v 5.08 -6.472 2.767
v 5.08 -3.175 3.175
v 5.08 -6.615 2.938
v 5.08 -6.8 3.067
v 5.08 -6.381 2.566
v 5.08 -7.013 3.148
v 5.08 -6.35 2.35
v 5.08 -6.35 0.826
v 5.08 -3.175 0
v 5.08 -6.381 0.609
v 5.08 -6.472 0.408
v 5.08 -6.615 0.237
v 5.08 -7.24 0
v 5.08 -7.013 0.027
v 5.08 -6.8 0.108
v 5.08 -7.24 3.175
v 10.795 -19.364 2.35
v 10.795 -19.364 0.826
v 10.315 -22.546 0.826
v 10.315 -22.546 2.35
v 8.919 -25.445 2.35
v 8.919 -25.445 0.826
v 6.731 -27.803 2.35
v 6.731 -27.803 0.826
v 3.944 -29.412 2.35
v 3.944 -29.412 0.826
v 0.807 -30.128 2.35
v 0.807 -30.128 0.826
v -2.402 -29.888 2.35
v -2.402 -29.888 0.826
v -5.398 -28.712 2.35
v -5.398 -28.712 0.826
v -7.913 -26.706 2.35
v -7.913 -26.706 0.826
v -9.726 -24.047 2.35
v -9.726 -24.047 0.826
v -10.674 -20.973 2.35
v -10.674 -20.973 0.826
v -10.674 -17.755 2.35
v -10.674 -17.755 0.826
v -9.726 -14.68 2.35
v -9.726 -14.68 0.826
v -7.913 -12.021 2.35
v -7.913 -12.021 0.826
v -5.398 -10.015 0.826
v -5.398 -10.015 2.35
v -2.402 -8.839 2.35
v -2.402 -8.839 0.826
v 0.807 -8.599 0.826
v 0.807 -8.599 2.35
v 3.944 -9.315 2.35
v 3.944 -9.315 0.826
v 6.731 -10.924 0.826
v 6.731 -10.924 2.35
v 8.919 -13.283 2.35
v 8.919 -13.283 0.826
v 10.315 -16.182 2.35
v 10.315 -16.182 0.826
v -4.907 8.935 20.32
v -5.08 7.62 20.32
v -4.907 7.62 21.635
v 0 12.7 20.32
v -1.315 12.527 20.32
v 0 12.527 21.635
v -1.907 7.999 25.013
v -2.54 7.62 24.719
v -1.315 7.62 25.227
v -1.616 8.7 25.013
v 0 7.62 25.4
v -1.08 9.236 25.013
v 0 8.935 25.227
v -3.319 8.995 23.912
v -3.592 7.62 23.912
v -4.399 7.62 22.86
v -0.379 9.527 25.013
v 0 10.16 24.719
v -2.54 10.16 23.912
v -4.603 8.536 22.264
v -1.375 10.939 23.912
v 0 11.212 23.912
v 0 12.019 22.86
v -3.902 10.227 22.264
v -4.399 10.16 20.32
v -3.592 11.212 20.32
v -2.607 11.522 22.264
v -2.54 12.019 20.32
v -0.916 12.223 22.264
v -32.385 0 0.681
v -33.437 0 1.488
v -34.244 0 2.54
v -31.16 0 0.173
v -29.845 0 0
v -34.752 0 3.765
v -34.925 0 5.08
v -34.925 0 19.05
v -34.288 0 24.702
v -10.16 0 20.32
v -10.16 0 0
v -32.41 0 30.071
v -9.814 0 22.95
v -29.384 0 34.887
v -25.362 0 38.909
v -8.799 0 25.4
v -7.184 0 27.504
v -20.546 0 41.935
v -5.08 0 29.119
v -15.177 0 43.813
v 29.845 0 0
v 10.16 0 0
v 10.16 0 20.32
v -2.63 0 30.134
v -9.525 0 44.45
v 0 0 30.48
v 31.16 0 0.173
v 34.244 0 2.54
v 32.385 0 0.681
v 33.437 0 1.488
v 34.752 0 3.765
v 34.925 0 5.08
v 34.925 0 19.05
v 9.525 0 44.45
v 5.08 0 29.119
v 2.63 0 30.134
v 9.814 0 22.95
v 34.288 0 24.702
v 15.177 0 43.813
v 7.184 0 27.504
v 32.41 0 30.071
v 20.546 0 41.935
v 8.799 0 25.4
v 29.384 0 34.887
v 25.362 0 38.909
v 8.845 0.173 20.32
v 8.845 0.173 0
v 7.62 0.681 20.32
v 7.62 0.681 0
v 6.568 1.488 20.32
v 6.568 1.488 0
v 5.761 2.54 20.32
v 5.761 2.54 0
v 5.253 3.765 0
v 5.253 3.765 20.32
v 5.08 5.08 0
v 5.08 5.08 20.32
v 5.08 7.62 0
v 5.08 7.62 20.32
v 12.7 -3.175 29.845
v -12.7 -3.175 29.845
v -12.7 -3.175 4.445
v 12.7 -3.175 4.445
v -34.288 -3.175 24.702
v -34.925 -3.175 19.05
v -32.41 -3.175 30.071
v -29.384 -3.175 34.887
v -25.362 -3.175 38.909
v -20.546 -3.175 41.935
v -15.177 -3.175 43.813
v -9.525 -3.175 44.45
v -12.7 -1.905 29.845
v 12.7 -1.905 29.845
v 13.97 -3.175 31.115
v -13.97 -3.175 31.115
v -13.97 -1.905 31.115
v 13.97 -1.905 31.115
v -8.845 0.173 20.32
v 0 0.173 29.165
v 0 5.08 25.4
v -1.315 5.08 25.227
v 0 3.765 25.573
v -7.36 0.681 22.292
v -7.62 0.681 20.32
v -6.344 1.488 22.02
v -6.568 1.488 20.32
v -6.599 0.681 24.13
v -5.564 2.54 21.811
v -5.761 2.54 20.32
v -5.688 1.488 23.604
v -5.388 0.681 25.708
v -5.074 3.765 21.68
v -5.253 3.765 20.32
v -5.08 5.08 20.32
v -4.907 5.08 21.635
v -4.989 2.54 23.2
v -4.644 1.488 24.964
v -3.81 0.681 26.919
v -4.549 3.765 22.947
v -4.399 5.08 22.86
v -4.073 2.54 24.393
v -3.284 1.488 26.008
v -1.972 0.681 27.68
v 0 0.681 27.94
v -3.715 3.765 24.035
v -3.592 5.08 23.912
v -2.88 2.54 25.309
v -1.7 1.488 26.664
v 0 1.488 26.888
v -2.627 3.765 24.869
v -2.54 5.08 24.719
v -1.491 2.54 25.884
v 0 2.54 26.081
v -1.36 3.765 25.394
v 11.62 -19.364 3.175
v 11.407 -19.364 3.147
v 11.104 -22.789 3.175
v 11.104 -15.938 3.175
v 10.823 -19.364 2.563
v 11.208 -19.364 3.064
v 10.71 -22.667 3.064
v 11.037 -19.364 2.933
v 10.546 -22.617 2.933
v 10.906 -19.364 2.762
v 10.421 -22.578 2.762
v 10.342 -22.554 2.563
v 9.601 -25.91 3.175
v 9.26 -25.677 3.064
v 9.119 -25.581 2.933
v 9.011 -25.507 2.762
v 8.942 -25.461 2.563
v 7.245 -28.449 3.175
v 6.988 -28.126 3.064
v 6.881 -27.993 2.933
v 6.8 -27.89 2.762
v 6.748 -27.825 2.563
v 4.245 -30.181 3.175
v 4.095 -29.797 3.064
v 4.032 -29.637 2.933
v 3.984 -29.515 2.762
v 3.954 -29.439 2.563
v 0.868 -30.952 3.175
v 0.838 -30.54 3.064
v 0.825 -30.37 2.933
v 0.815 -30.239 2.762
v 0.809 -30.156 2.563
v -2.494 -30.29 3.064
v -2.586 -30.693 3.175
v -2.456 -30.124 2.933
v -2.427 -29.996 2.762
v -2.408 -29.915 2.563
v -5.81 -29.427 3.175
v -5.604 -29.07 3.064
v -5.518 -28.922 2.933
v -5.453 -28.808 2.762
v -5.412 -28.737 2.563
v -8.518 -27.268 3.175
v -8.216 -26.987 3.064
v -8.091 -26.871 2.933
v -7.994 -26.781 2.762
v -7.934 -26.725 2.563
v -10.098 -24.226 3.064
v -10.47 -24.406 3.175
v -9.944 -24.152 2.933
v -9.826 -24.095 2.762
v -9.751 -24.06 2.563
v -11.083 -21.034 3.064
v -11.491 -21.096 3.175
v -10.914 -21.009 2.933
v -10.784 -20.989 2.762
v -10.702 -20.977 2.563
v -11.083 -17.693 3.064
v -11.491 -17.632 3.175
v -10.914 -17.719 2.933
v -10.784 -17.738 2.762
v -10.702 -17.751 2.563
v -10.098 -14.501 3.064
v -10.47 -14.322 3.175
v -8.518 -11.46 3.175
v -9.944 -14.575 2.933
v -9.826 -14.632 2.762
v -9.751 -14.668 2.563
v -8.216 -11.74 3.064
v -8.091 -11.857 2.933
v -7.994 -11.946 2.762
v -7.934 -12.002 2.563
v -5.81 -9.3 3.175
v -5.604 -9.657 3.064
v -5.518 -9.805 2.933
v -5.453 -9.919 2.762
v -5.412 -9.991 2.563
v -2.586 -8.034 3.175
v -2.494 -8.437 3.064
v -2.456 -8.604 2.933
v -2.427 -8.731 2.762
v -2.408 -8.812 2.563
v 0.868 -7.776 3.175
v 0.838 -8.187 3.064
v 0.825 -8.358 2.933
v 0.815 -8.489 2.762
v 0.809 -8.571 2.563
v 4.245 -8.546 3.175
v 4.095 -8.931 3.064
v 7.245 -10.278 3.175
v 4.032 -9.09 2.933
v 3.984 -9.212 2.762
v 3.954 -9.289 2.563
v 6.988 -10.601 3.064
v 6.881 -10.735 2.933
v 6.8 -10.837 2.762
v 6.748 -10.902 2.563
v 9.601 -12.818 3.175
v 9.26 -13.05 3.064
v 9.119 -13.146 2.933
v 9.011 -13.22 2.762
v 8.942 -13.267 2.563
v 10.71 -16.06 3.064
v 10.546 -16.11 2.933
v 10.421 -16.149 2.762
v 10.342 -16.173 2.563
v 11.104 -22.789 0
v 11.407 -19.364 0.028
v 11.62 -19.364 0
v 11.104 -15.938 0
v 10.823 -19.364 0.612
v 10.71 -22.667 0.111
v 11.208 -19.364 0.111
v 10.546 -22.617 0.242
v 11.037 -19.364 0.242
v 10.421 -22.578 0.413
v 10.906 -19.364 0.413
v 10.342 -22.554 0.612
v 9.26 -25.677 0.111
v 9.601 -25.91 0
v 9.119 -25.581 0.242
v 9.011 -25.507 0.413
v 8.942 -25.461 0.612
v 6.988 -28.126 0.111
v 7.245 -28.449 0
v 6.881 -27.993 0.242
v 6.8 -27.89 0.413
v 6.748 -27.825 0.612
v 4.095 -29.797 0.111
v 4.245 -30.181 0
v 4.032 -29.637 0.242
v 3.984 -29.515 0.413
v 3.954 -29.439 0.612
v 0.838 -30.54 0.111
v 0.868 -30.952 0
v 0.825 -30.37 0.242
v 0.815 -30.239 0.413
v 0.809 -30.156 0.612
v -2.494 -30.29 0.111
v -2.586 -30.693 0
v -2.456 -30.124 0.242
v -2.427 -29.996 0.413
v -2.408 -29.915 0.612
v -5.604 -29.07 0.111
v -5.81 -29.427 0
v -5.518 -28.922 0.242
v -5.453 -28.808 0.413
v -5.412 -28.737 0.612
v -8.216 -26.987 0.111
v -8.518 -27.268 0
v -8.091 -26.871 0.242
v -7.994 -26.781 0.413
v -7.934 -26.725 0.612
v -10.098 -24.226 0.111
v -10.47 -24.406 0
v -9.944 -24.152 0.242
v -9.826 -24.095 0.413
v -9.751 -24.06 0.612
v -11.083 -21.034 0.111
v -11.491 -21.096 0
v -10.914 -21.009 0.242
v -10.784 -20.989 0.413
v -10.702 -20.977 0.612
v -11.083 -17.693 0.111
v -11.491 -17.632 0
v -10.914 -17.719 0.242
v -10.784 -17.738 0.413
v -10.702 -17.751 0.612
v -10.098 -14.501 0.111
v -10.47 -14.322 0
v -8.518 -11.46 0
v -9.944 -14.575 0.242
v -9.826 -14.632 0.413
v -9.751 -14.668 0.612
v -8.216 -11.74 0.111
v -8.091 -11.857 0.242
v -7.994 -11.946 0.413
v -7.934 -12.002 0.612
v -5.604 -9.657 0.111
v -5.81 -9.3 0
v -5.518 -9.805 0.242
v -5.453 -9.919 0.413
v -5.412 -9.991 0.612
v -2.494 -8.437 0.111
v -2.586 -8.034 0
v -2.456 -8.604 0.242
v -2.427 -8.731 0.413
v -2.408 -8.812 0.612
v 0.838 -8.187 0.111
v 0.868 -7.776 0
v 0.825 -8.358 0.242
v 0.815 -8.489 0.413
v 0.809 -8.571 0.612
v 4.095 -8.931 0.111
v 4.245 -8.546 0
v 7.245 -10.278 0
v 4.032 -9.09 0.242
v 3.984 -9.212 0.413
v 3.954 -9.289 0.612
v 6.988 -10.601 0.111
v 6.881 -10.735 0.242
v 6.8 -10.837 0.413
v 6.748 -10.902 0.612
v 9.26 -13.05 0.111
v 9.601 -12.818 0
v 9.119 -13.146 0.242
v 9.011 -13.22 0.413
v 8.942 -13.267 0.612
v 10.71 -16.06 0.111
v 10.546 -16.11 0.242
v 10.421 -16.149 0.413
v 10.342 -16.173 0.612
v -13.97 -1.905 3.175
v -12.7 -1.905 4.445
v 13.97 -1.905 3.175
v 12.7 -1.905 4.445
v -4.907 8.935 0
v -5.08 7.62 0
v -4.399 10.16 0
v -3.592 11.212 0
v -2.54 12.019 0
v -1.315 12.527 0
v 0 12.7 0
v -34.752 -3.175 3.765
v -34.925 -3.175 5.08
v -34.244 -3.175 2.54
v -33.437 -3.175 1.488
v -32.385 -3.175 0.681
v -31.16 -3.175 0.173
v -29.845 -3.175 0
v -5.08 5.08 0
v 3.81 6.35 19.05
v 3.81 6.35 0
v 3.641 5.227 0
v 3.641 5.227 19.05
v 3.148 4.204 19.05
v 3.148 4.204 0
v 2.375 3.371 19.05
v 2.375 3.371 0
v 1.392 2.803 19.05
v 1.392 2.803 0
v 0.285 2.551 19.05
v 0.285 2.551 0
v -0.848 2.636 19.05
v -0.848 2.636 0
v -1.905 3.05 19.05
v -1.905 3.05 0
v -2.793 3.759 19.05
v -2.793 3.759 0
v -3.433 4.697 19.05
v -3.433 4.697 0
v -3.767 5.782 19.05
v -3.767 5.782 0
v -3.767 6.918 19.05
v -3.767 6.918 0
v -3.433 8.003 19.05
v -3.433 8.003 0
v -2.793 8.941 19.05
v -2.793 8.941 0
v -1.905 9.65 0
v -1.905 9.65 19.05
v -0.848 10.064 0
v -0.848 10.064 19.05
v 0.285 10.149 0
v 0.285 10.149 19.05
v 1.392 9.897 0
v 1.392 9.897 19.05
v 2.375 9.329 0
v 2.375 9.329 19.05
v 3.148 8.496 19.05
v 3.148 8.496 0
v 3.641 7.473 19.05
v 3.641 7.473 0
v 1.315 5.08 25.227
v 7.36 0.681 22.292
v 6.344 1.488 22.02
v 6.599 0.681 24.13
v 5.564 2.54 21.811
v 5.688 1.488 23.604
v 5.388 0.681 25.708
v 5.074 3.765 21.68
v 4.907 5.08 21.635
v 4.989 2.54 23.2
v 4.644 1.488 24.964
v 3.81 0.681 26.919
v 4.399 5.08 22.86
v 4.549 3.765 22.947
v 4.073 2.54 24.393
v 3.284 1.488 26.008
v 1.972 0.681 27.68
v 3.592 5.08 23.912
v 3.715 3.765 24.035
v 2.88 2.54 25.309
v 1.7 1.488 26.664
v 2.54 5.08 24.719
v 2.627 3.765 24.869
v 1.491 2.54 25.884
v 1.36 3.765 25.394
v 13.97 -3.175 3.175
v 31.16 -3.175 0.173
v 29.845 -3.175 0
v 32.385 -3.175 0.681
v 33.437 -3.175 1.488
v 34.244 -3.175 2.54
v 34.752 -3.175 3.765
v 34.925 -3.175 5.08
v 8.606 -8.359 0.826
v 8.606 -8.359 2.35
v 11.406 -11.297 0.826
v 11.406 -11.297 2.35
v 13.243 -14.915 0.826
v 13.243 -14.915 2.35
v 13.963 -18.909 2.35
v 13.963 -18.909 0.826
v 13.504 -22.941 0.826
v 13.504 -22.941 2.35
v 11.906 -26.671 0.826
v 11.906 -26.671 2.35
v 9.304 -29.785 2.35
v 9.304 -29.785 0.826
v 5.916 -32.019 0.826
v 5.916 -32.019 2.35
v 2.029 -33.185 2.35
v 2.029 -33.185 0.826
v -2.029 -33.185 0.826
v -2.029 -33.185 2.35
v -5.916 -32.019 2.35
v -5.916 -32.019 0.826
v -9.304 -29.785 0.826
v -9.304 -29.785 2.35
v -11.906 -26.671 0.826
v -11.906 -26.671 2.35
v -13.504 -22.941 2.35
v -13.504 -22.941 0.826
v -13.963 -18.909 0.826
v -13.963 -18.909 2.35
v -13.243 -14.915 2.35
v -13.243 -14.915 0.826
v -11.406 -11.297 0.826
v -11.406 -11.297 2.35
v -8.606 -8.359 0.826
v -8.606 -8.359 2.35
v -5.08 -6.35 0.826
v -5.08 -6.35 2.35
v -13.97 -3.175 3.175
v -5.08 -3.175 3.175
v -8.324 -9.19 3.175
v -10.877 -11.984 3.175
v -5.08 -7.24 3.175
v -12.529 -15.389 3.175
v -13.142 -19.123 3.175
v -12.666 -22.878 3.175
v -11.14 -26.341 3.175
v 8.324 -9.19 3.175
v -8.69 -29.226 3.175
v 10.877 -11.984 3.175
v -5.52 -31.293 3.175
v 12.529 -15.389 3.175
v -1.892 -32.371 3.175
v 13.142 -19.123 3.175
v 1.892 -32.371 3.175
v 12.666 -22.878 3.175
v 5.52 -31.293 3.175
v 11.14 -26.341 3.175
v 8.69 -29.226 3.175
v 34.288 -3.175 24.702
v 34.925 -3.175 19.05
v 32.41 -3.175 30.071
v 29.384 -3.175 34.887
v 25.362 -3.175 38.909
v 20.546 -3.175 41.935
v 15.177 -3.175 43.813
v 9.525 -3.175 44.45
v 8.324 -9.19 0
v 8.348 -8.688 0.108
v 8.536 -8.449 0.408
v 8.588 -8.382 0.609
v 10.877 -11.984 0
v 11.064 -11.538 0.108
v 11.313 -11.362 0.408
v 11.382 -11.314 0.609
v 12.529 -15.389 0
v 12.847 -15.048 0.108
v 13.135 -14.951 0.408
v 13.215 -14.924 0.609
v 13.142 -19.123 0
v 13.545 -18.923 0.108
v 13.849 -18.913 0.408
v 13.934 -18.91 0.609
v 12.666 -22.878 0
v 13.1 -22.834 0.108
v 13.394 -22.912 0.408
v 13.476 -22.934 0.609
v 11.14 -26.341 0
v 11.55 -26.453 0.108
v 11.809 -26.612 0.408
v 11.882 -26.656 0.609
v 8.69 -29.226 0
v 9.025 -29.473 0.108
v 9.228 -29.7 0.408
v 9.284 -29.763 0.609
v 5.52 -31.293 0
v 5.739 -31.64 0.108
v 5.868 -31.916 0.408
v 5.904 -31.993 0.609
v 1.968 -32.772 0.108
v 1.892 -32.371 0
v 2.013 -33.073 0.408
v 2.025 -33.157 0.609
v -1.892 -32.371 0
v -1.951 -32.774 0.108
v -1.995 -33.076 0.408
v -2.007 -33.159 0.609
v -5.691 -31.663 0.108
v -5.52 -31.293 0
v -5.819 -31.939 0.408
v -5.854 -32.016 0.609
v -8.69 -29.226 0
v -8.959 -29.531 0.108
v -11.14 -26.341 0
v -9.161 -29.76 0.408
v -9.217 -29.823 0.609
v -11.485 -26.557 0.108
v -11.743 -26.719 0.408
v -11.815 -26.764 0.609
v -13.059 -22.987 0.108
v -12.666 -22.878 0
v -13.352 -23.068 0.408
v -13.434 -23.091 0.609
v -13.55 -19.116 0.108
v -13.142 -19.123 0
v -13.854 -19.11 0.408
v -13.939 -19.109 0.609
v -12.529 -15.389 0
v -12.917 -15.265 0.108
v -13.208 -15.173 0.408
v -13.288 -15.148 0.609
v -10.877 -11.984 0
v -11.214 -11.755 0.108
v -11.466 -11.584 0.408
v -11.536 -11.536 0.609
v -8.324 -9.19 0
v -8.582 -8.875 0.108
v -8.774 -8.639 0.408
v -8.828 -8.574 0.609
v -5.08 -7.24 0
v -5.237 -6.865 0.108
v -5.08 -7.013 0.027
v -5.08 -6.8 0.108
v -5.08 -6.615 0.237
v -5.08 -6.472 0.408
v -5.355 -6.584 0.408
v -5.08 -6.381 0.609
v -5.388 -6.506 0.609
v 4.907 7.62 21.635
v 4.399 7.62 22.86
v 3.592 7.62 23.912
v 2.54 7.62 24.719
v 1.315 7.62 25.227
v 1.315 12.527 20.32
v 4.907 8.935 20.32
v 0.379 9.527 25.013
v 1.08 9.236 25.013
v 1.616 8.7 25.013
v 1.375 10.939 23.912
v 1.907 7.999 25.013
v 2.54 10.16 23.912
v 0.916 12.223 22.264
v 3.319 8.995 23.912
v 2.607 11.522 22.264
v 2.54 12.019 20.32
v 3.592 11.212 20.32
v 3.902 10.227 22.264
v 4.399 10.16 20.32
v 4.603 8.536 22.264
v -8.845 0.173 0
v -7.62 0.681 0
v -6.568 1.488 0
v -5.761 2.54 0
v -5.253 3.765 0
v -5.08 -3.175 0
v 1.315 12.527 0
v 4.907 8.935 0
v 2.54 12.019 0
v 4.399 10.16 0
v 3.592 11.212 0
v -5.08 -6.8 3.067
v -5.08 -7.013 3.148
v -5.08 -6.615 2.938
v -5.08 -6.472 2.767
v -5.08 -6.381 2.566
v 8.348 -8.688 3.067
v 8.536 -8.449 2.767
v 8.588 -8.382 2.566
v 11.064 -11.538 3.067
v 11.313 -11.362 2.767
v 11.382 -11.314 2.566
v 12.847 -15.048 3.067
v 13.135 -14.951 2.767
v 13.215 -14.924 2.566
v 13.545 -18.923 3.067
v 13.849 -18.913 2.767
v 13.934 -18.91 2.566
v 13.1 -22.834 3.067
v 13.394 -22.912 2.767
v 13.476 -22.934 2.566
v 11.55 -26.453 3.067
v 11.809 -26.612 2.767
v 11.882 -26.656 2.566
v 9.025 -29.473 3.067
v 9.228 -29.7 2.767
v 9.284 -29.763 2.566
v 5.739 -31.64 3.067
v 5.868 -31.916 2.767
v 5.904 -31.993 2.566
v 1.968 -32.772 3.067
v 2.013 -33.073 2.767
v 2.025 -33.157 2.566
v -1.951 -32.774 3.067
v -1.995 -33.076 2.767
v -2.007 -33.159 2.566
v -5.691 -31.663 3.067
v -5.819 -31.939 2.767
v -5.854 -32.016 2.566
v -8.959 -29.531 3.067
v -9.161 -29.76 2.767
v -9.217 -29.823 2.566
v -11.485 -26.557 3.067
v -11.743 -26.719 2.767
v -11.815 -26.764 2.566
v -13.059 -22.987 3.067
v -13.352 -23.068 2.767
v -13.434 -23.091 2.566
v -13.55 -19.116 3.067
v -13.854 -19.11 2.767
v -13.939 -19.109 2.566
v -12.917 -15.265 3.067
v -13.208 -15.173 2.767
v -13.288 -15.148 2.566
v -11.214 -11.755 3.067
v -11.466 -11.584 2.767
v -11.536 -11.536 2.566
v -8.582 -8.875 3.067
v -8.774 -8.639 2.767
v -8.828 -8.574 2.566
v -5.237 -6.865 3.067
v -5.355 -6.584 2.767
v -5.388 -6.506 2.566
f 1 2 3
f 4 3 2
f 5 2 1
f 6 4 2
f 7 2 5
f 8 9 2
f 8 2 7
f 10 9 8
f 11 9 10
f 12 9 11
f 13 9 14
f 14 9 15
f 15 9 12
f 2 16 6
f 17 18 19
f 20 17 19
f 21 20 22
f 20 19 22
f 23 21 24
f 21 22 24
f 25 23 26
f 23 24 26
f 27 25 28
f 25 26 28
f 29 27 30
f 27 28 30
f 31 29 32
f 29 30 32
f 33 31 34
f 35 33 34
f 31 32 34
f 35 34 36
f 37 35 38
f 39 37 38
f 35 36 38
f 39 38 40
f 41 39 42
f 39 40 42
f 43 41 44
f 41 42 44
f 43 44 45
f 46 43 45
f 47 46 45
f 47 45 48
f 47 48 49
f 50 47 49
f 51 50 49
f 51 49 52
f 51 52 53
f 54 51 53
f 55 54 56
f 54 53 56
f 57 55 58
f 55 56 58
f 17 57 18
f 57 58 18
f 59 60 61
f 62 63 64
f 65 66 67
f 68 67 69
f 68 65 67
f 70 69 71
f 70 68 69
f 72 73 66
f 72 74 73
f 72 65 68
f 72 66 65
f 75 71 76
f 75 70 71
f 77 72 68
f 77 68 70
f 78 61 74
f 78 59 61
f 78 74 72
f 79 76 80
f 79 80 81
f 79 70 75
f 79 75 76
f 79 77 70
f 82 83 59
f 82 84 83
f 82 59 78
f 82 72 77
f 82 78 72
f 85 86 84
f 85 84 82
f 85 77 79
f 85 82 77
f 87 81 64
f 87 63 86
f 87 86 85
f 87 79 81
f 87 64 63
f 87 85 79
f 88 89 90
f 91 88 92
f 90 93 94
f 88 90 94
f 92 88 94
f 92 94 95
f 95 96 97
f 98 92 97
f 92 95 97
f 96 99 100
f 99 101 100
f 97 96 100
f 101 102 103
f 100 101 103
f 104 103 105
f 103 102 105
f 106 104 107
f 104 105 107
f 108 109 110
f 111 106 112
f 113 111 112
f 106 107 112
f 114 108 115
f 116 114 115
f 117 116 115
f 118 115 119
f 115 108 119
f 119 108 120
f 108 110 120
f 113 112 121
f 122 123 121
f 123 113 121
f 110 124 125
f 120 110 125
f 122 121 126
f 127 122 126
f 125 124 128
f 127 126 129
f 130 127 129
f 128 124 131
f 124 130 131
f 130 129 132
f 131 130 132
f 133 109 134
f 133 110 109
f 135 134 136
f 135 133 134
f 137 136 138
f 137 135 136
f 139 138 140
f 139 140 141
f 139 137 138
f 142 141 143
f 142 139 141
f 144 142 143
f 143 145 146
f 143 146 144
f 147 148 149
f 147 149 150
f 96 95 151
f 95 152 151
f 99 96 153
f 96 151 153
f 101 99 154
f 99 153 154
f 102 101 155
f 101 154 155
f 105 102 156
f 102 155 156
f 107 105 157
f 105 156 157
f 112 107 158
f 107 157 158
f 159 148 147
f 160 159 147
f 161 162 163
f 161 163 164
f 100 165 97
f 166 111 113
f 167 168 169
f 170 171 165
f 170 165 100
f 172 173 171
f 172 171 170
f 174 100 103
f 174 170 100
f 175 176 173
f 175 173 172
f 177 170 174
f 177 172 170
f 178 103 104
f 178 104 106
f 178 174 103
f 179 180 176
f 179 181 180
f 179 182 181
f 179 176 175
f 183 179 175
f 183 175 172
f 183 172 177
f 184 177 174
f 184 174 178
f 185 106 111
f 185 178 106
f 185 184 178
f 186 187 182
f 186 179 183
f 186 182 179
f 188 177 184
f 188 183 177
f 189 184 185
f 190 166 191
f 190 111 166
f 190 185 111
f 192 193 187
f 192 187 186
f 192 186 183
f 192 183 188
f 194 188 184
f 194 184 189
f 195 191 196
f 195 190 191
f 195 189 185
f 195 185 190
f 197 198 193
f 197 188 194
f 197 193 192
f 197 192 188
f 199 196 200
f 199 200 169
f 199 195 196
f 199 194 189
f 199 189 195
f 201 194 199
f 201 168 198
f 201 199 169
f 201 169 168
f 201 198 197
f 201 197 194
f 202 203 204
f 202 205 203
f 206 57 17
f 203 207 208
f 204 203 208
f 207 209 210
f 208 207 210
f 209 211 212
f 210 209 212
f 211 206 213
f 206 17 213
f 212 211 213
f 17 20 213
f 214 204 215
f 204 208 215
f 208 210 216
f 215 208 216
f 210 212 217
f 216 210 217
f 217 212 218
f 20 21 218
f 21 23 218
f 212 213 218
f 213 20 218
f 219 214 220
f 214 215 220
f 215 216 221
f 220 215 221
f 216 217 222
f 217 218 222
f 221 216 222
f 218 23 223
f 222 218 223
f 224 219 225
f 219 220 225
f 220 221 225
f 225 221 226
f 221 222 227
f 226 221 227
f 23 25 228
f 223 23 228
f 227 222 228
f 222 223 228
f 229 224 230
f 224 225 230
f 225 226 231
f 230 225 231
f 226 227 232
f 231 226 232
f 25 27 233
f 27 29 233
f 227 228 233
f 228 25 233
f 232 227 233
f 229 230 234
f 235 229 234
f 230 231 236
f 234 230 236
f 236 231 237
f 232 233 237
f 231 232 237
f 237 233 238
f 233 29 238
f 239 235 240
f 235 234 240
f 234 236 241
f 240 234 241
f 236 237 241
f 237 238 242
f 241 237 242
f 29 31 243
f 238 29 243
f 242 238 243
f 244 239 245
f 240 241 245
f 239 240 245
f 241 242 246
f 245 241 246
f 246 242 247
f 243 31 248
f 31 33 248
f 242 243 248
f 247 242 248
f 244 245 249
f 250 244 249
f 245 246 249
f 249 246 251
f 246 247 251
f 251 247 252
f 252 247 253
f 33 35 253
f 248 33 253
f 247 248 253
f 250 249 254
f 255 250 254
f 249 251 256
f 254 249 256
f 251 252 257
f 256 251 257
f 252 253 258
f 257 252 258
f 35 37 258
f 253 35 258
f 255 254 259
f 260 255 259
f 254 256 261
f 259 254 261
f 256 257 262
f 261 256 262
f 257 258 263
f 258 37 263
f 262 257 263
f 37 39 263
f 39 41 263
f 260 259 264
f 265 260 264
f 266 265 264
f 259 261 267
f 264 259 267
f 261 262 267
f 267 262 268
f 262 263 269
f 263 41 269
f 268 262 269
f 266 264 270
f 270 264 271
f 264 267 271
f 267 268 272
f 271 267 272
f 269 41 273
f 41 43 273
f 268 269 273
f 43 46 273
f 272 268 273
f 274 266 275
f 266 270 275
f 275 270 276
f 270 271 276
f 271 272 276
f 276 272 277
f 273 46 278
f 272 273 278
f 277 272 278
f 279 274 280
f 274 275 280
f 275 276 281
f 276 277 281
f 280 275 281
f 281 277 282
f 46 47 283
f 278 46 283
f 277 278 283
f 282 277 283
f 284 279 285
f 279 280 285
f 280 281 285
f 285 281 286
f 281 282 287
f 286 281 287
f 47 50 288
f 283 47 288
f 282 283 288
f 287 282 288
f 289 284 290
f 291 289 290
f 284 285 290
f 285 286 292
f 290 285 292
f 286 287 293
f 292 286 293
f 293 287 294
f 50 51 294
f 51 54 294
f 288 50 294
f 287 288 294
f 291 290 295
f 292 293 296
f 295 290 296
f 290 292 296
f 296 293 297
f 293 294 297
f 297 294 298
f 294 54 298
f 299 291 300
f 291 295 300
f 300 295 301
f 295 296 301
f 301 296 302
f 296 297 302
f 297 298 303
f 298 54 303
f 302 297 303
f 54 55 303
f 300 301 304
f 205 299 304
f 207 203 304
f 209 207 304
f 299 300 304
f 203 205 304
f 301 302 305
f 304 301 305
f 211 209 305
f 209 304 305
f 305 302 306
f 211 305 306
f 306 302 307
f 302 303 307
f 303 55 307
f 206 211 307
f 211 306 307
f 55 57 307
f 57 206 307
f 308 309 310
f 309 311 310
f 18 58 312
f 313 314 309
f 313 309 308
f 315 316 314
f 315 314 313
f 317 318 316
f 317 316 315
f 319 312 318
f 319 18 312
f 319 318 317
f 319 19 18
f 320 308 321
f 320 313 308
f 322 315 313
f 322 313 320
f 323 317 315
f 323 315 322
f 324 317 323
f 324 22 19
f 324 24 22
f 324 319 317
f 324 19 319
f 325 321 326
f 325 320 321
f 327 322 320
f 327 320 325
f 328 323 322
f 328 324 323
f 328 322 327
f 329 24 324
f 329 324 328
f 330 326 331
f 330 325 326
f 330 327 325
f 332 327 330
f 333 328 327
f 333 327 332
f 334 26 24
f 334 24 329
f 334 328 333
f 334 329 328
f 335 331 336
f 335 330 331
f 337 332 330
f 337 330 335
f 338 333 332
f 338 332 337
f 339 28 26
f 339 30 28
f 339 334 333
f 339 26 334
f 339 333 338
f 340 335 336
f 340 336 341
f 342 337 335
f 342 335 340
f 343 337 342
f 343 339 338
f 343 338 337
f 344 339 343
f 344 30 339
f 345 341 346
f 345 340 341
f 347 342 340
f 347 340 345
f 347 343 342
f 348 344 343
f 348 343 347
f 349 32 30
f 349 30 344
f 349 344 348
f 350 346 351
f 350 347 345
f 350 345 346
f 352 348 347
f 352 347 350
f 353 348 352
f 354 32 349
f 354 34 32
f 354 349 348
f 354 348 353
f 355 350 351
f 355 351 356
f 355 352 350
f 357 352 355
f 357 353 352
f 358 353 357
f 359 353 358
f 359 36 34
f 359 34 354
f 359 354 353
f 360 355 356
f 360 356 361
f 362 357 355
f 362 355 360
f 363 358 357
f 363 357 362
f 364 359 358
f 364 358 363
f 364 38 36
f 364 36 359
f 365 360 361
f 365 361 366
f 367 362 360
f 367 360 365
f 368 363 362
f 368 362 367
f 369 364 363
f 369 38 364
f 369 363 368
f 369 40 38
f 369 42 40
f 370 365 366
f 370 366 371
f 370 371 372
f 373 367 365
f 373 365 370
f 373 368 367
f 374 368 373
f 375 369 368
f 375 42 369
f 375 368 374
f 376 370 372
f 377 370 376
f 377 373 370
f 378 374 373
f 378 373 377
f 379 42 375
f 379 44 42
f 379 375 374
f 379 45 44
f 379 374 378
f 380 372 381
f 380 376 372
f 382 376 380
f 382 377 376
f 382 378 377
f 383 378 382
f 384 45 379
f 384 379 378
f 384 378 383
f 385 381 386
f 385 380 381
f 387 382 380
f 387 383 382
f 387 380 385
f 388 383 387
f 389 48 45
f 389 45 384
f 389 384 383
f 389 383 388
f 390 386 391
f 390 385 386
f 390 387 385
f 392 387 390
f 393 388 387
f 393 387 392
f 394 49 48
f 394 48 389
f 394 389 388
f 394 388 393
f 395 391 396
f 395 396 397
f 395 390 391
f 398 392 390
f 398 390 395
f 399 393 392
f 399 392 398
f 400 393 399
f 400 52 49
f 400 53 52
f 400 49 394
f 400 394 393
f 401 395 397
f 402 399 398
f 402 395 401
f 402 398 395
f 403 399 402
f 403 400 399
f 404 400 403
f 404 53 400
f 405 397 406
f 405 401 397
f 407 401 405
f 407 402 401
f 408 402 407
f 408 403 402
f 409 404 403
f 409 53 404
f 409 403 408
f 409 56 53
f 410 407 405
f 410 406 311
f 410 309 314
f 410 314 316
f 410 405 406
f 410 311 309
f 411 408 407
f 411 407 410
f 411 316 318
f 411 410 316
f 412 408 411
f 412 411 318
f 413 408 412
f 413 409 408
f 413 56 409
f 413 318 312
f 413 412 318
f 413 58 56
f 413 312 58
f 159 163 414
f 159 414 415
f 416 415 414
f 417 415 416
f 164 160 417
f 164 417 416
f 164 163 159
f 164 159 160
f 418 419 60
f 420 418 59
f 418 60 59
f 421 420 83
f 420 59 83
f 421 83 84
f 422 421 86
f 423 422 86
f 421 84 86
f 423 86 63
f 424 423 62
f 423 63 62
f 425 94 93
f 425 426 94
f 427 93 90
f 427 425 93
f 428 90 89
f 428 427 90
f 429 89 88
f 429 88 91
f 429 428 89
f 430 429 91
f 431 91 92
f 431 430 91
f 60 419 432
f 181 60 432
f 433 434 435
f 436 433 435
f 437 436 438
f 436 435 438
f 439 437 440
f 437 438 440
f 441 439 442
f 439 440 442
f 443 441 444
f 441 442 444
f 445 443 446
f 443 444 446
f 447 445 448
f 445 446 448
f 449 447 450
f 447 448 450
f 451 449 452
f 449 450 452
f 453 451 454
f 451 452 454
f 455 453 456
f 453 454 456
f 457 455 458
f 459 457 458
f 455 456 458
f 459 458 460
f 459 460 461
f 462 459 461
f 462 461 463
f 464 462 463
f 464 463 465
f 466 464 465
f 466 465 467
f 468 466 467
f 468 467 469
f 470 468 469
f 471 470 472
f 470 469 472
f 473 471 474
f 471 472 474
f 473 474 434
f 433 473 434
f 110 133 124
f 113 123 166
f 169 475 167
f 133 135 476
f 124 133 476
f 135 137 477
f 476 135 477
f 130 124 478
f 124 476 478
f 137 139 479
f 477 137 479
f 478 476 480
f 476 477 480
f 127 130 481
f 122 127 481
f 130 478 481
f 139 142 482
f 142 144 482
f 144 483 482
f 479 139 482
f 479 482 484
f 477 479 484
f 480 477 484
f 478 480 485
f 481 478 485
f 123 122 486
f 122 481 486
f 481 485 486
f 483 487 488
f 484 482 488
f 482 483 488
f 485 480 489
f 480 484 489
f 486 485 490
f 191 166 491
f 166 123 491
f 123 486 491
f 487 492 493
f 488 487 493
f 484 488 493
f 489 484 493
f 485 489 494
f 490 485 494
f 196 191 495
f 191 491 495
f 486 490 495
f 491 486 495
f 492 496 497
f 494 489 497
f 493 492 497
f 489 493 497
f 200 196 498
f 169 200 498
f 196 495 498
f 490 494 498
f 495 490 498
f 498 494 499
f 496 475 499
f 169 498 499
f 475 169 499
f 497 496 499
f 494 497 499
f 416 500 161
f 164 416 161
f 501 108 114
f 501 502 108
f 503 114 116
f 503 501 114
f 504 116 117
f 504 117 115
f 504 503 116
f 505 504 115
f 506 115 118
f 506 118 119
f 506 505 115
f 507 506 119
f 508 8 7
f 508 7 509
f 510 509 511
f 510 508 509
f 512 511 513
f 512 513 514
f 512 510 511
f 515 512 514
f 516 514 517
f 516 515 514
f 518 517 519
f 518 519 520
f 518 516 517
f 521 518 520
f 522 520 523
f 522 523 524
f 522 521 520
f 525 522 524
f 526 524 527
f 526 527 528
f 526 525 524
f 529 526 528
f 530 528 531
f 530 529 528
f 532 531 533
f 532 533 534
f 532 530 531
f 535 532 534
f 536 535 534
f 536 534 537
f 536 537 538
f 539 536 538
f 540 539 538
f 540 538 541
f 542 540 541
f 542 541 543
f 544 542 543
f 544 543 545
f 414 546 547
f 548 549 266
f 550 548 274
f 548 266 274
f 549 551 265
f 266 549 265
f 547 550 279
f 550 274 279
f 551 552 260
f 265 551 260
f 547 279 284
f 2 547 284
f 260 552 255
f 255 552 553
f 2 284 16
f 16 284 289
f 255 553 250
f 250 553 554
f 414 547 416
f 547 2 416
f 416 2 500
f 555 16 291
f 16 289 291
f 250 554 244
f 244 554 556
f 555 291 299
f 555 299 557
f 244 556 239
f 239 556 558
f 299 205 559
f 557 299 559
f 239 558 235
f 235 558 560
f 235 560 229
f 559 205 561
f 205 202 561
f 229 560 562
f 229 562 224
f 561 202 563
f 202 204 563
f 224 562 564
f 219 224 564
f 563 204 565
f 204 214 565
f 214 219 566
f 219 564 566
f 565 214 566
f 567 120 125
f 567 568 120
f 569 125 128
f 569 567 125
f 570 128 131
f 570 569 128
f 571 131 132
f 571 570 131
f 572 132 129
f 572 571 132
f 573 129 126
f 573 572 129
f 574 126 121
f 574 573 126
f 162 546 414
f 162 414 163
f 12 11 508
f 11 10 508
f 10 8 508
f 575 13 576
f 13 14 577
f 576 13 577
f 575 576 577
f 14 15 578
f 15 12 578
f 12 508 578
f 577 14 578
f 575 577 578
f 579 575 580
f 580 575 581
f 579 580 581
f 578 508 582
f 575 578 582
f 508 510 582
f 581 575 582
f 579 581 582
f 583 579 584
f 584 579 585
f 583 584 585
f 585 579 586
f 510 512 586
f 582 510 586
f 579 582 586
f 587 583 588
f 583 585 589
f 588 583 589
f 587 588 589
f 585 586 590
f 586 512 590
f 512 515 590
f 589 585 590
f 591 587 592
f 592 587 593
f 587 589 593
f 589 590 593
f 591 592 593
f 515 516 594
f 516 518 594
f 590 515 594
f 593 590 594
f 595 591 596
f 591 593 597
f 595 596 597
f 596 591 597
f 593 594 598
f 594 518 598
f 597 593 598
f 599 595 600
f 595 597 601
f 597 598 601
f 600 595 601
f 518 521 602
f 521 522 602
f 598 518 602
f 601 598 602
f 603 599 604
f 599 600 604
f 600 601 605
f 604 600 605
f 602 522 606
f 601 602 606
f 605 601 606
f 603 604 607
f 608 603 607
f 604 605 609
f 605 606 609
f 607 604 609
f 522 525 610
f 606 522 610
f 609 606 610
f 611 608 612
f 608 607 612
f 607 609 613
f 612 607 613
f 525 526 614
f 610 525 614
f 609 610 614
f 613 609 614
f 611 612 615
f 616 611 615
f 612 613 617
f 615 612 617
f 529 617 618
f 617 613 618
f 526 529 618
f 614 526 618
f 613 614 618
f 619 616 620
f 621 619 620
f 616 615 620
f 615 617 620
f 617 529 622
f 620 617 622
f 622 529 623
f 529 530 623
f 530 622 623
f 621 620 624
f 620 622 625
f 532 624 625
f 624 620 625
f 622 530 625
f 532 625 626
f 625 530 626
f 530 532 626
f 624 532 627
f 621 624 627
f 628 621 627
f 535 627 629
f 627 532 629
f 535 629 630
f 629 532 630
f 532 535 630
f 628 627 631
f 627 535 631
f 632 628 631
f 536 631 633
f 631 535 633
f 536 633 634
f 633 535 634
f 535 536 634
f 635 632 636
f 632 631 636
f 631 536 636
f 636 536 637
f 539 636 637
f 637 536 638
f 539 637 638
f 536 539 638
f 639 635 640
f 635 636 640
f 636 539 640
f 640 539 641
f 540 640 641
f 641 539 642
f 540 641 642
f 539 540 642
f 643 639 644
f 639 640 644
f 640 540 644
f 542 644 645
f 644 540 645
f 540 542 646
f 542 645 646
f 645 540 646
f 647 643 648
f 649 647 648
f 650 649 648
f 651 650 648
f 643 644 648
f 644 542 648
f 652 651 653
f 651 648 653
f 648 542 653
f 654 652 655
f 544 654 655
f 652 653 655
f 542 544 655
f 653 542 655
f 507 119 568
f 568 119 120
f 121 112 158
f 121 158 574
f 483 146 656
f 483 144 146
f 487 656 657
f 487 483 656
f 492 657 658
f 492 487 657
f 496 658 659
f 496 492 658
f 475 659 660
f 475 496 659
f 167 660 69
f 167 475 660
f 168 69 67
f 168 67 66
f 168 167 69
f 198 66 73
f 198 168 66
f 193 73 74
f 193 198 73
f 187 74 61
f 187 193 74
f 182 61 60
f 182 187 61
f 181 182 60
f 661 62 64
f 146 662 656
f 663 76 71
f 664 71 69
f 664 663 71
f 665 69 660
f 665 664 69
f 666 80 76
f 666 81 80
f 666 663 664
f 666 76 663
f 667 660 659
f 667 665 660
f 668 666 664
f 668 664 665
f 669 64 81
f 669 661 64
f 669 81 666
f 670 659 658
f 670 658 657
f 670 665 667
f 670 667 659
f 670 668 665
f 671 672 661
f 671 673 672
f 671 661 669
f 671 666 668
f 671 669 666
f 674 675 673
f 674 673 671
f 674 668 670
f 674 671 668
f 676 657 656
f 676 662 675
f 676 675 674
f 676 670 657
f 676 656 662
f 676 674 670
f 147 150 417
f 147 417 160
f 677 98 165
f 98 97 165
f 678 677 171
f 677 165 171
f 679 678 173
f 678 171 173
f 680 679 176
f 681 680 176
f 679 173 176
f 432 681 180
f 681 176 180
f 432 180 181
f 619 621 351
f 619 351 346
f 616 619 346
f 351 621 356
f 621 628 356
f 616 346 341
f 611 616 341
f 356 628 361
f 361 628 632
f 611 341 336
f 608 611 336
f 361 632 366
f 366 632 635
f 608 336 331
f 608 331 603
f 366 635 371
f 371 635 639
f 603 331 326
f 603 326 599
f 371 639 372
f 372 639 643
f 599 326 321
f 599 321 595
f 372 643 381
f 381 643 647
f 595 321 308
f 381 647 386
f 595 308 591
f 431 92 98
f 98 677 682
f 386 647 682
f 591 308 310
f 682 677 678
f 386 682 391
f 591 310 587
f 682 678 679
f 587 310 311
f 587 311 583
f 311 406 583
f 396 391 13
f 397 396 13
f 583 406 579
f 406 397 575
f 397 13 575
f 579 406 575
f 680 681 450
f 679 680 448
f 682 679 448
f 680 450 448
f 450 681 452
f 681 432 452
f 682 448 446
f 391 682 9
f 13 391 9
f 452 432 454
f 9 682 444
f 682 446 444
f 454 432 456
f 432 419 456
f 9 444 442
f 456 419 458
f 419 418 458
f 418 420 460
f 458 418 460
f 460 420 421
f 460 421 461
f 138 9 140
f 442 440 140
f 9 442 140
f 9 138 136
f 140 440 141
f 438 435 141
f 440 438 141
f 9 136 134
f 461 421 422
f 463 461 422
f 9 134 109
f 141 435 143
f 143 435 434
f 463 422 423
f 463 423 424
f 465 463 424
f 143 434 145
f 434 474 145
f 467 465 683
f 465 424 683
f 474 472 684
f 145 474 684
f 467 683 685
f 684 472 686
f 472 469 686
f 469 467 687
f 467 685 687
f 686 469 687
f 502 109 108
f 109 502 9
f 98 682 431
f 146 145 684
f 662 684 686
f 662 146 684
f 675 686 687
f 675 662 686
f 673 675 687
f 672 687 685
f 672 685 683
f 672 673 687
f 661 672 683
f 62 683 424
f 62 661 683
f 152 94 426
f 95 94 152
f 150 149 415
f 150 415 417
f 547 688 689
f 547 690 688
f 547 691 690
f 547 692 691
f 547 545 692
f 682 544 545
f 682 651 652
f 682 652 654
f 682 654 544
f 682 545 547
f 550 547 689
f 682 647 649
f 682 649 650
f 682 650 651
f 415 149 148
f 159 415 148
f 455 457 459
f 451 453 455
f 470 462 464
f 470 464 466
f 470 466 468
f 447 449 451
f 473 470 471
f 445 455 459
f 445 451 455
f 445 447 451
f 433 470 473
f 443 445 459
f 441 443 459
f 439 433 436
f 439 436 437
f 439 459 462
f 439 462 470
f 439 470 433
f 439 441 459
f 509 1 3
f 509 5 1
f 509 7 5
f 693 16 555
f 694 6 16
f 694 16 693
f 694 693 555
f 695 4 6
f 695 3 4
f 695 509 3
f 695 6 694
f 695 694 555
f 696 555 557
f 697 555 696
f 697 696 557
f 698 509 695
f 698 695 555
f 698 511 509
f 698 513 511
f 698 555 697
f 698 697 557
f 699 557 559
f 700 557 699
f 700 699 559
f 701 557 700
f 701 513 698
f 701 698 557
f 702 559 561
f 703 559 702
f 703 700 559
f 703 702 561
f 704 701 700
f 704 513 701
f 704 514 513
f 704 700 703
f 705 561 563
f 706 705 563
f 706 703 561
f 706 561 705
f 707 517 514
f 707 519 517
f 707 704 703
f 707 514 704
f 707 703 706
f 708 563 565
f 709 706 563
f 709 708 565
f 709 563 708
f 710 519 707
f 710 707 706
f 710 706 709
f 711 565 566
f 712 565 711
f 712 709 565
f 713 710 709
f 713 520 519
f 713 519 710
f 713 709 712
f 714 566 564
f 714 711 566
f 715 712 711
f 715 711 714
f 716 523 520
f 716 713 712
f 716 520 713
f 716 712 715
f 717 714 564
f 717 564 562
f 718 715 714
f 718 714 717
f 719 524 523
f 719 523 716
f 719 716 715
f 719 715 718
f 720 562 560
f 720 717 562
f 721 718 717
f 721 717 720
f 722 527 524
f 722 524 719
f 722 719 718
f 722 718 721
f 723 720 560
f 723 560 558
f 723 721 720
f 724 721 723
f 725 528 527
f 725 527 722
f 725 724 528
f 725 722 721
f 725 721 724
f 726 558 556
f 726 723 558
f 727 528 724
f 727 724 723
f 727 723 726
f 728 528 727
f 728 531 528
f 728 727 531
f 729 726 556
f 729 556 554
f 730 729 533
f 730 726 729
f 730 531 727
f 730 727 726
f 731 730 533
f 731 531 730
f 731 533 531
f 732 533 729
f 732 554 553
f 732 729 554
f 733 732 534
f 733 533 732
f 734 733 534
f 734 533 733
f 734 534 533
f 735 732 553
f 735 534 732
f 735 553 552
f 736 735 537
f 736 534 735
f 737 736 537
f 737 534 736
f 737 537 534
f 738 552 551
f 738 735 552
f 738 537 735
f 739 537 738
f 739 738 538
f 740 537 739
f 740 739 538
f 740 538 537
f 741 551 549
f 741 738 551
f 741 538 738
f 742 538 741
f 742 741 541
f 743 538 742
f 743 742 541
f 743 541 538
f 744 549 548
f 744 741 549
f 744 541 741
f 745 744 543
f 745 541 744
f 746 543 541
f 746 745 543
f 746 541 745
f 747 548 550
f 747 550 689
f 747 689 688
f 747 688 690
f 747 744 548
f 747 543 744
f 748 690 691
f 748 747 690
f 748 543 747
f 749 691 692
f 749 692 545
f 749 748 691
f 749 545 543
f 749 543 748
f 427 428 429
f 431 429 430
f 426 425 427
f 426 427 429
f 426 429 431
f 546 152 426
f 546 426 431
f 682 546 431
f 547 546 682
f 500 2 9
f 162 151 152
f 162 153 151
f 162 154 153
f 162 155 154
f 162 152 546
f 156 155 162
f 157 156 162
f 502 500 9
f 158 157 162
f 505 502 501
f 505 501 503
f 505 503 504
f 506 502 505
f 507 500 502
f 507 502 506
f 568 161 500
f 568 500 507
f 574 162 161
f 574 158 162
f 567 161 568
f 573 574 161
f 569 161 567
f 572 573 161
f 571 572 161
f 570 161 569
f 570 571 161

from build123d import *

# Parameters (mm, degrees)
F0_W      = 69.85
F0_H      = 44.45
F1_DEPTH  = 3.175
F2_R      = 25.4
F3_R      = 5.08
F4_W      = 10.16
F4_H      = 12.7
F5_DEPTH  = 25.4
F6_R      = 3.81
F7_DEPTH  = 19.05
F8_R      = 5.07999
F9_R      = 10.795
F10_DEPTH = 3.175
F11_R     = 0.8255
F12_W     = 27.94
F12_H     = 27.94
F12_W_2   = 25.4
F12_H_2   = 25.4
F13_DEPTH = 1.27


# Not quite as in the source:
# - a fillet or chamfer is up to 0.001 mm smaller than in the source, because OpenCascade refuses the exact size


with BuildPart() as f1:
    # F0 (on Front) → F1 (new body)
    with BuildSketch(Plane.XZ):
        with Locations((0, 22.225)):
            Rectangle(F0_W, F0_H)
    extrude(amount=F1_DEPTH)

    # F2
    f2_edges = [f1.edges().sort_by_distance(p)[0] for p in [
        (-34.925, -1.5875, 44.45),
        (34.925, -1.5875, 44.45),
    ]]
    fillet(f2_edges, radius=F2_R)

    # F3
    f3_edges = [f1.edges().sort_by_distance(p)[0] for p in [
        (-34.925, -1.5875, 0),
        (34.925, -1.5875, 0),
    ]]
    fillet(f3_edges, radius=F3_R)

    # F4 (on face) → F5 (join)
    with BuildSketch(Plane(origin=(0, 0, 0), x_dir=(1, 0, 0), z_dir=(0, 0, -1))):
        with Locations((0, -6.35)):
            Rectangle(F4_W, F4_H)
    extrude(amount=-F5_DEPTH)

    # F6 (on face) → F7 (cut)
    with BuildSketch(Plane(origin=(0, 0, 0), x_dir=(1, 0, 0), z_dir=(0, 0, -1))):
        with Locations((0, -6.35)):
            Circle(F6_R)
    extrude(amount=-F7_DEPTH, mode=Mode.SUBTRACT)

    # F8 (radius 5.08 in the source; OpenCascade refuses exactly that, so slightly less here)
    f8_edges = [f1.edges().sort_by_distance(p)[0] for p in [
        (-5.08, 12.7, 12.7),
        (5.08, 12.7, 12.7),
        (0, 0, 25.4),
        (-5.08, 6.35, 25.4),
        (0, 12.7, 25.4),
        (5.08, 6.35, 25.4),
        (5.08, 0, 12.7),
        (-5.08, 0, 12.7),
    ]]
    fillet(f8_edges, radius=F8_R)

    # F9 (on face) → F10 (join)
    with BuildSketch(Plane(origin=(0, 0, 0), x_dir=(1, 0, 0), z_dir=(0, 0, -1))):
        with BuildLine():
            Line((-5.08, 6.35), (-5.08, 3.175))
            Line((-5.08, 3.175), (5.08, 3.175))
            Line((5.08, 3.175), (5.08, 6.35))
            ThreePointArc((5.08, 6.35), (0, 33.3336274728), (-5.08, 6.35))
        make_face()
        with Locations((0, 19.3636274728)):
            Circle(F9_R, mode=Mode.SUBTRACT)
    extrude(amount=-F10_DEPTH)

    # F11
    f11_edges = [f1.edges().sort_by_distance(p)[0] for p in [
        (-10.795, -19.363627, 3.175),
        (0, -33.333627, 3.175),
        (0, -33.333627, 0),
        (-10.795, -19.363627, 0),
    ]]
    fillet(f11_edges, radius=F11_R)

    # F12 (on face) → F13 (cut)
    with BuildSketch(Plane.XZ.offset(3.175)):
        with Locations((0, 17.145)):
            Rectangle(F12_W, F12_H)
        with Locations((0, 17.145)):
            Rectangle(F12_W_2, F12_H_2, mode=Mode.SUBTRACT)
    extrude(amount=-F13_DEPTH, mode=Mode.SUBTRACT)


solid = f1.part
